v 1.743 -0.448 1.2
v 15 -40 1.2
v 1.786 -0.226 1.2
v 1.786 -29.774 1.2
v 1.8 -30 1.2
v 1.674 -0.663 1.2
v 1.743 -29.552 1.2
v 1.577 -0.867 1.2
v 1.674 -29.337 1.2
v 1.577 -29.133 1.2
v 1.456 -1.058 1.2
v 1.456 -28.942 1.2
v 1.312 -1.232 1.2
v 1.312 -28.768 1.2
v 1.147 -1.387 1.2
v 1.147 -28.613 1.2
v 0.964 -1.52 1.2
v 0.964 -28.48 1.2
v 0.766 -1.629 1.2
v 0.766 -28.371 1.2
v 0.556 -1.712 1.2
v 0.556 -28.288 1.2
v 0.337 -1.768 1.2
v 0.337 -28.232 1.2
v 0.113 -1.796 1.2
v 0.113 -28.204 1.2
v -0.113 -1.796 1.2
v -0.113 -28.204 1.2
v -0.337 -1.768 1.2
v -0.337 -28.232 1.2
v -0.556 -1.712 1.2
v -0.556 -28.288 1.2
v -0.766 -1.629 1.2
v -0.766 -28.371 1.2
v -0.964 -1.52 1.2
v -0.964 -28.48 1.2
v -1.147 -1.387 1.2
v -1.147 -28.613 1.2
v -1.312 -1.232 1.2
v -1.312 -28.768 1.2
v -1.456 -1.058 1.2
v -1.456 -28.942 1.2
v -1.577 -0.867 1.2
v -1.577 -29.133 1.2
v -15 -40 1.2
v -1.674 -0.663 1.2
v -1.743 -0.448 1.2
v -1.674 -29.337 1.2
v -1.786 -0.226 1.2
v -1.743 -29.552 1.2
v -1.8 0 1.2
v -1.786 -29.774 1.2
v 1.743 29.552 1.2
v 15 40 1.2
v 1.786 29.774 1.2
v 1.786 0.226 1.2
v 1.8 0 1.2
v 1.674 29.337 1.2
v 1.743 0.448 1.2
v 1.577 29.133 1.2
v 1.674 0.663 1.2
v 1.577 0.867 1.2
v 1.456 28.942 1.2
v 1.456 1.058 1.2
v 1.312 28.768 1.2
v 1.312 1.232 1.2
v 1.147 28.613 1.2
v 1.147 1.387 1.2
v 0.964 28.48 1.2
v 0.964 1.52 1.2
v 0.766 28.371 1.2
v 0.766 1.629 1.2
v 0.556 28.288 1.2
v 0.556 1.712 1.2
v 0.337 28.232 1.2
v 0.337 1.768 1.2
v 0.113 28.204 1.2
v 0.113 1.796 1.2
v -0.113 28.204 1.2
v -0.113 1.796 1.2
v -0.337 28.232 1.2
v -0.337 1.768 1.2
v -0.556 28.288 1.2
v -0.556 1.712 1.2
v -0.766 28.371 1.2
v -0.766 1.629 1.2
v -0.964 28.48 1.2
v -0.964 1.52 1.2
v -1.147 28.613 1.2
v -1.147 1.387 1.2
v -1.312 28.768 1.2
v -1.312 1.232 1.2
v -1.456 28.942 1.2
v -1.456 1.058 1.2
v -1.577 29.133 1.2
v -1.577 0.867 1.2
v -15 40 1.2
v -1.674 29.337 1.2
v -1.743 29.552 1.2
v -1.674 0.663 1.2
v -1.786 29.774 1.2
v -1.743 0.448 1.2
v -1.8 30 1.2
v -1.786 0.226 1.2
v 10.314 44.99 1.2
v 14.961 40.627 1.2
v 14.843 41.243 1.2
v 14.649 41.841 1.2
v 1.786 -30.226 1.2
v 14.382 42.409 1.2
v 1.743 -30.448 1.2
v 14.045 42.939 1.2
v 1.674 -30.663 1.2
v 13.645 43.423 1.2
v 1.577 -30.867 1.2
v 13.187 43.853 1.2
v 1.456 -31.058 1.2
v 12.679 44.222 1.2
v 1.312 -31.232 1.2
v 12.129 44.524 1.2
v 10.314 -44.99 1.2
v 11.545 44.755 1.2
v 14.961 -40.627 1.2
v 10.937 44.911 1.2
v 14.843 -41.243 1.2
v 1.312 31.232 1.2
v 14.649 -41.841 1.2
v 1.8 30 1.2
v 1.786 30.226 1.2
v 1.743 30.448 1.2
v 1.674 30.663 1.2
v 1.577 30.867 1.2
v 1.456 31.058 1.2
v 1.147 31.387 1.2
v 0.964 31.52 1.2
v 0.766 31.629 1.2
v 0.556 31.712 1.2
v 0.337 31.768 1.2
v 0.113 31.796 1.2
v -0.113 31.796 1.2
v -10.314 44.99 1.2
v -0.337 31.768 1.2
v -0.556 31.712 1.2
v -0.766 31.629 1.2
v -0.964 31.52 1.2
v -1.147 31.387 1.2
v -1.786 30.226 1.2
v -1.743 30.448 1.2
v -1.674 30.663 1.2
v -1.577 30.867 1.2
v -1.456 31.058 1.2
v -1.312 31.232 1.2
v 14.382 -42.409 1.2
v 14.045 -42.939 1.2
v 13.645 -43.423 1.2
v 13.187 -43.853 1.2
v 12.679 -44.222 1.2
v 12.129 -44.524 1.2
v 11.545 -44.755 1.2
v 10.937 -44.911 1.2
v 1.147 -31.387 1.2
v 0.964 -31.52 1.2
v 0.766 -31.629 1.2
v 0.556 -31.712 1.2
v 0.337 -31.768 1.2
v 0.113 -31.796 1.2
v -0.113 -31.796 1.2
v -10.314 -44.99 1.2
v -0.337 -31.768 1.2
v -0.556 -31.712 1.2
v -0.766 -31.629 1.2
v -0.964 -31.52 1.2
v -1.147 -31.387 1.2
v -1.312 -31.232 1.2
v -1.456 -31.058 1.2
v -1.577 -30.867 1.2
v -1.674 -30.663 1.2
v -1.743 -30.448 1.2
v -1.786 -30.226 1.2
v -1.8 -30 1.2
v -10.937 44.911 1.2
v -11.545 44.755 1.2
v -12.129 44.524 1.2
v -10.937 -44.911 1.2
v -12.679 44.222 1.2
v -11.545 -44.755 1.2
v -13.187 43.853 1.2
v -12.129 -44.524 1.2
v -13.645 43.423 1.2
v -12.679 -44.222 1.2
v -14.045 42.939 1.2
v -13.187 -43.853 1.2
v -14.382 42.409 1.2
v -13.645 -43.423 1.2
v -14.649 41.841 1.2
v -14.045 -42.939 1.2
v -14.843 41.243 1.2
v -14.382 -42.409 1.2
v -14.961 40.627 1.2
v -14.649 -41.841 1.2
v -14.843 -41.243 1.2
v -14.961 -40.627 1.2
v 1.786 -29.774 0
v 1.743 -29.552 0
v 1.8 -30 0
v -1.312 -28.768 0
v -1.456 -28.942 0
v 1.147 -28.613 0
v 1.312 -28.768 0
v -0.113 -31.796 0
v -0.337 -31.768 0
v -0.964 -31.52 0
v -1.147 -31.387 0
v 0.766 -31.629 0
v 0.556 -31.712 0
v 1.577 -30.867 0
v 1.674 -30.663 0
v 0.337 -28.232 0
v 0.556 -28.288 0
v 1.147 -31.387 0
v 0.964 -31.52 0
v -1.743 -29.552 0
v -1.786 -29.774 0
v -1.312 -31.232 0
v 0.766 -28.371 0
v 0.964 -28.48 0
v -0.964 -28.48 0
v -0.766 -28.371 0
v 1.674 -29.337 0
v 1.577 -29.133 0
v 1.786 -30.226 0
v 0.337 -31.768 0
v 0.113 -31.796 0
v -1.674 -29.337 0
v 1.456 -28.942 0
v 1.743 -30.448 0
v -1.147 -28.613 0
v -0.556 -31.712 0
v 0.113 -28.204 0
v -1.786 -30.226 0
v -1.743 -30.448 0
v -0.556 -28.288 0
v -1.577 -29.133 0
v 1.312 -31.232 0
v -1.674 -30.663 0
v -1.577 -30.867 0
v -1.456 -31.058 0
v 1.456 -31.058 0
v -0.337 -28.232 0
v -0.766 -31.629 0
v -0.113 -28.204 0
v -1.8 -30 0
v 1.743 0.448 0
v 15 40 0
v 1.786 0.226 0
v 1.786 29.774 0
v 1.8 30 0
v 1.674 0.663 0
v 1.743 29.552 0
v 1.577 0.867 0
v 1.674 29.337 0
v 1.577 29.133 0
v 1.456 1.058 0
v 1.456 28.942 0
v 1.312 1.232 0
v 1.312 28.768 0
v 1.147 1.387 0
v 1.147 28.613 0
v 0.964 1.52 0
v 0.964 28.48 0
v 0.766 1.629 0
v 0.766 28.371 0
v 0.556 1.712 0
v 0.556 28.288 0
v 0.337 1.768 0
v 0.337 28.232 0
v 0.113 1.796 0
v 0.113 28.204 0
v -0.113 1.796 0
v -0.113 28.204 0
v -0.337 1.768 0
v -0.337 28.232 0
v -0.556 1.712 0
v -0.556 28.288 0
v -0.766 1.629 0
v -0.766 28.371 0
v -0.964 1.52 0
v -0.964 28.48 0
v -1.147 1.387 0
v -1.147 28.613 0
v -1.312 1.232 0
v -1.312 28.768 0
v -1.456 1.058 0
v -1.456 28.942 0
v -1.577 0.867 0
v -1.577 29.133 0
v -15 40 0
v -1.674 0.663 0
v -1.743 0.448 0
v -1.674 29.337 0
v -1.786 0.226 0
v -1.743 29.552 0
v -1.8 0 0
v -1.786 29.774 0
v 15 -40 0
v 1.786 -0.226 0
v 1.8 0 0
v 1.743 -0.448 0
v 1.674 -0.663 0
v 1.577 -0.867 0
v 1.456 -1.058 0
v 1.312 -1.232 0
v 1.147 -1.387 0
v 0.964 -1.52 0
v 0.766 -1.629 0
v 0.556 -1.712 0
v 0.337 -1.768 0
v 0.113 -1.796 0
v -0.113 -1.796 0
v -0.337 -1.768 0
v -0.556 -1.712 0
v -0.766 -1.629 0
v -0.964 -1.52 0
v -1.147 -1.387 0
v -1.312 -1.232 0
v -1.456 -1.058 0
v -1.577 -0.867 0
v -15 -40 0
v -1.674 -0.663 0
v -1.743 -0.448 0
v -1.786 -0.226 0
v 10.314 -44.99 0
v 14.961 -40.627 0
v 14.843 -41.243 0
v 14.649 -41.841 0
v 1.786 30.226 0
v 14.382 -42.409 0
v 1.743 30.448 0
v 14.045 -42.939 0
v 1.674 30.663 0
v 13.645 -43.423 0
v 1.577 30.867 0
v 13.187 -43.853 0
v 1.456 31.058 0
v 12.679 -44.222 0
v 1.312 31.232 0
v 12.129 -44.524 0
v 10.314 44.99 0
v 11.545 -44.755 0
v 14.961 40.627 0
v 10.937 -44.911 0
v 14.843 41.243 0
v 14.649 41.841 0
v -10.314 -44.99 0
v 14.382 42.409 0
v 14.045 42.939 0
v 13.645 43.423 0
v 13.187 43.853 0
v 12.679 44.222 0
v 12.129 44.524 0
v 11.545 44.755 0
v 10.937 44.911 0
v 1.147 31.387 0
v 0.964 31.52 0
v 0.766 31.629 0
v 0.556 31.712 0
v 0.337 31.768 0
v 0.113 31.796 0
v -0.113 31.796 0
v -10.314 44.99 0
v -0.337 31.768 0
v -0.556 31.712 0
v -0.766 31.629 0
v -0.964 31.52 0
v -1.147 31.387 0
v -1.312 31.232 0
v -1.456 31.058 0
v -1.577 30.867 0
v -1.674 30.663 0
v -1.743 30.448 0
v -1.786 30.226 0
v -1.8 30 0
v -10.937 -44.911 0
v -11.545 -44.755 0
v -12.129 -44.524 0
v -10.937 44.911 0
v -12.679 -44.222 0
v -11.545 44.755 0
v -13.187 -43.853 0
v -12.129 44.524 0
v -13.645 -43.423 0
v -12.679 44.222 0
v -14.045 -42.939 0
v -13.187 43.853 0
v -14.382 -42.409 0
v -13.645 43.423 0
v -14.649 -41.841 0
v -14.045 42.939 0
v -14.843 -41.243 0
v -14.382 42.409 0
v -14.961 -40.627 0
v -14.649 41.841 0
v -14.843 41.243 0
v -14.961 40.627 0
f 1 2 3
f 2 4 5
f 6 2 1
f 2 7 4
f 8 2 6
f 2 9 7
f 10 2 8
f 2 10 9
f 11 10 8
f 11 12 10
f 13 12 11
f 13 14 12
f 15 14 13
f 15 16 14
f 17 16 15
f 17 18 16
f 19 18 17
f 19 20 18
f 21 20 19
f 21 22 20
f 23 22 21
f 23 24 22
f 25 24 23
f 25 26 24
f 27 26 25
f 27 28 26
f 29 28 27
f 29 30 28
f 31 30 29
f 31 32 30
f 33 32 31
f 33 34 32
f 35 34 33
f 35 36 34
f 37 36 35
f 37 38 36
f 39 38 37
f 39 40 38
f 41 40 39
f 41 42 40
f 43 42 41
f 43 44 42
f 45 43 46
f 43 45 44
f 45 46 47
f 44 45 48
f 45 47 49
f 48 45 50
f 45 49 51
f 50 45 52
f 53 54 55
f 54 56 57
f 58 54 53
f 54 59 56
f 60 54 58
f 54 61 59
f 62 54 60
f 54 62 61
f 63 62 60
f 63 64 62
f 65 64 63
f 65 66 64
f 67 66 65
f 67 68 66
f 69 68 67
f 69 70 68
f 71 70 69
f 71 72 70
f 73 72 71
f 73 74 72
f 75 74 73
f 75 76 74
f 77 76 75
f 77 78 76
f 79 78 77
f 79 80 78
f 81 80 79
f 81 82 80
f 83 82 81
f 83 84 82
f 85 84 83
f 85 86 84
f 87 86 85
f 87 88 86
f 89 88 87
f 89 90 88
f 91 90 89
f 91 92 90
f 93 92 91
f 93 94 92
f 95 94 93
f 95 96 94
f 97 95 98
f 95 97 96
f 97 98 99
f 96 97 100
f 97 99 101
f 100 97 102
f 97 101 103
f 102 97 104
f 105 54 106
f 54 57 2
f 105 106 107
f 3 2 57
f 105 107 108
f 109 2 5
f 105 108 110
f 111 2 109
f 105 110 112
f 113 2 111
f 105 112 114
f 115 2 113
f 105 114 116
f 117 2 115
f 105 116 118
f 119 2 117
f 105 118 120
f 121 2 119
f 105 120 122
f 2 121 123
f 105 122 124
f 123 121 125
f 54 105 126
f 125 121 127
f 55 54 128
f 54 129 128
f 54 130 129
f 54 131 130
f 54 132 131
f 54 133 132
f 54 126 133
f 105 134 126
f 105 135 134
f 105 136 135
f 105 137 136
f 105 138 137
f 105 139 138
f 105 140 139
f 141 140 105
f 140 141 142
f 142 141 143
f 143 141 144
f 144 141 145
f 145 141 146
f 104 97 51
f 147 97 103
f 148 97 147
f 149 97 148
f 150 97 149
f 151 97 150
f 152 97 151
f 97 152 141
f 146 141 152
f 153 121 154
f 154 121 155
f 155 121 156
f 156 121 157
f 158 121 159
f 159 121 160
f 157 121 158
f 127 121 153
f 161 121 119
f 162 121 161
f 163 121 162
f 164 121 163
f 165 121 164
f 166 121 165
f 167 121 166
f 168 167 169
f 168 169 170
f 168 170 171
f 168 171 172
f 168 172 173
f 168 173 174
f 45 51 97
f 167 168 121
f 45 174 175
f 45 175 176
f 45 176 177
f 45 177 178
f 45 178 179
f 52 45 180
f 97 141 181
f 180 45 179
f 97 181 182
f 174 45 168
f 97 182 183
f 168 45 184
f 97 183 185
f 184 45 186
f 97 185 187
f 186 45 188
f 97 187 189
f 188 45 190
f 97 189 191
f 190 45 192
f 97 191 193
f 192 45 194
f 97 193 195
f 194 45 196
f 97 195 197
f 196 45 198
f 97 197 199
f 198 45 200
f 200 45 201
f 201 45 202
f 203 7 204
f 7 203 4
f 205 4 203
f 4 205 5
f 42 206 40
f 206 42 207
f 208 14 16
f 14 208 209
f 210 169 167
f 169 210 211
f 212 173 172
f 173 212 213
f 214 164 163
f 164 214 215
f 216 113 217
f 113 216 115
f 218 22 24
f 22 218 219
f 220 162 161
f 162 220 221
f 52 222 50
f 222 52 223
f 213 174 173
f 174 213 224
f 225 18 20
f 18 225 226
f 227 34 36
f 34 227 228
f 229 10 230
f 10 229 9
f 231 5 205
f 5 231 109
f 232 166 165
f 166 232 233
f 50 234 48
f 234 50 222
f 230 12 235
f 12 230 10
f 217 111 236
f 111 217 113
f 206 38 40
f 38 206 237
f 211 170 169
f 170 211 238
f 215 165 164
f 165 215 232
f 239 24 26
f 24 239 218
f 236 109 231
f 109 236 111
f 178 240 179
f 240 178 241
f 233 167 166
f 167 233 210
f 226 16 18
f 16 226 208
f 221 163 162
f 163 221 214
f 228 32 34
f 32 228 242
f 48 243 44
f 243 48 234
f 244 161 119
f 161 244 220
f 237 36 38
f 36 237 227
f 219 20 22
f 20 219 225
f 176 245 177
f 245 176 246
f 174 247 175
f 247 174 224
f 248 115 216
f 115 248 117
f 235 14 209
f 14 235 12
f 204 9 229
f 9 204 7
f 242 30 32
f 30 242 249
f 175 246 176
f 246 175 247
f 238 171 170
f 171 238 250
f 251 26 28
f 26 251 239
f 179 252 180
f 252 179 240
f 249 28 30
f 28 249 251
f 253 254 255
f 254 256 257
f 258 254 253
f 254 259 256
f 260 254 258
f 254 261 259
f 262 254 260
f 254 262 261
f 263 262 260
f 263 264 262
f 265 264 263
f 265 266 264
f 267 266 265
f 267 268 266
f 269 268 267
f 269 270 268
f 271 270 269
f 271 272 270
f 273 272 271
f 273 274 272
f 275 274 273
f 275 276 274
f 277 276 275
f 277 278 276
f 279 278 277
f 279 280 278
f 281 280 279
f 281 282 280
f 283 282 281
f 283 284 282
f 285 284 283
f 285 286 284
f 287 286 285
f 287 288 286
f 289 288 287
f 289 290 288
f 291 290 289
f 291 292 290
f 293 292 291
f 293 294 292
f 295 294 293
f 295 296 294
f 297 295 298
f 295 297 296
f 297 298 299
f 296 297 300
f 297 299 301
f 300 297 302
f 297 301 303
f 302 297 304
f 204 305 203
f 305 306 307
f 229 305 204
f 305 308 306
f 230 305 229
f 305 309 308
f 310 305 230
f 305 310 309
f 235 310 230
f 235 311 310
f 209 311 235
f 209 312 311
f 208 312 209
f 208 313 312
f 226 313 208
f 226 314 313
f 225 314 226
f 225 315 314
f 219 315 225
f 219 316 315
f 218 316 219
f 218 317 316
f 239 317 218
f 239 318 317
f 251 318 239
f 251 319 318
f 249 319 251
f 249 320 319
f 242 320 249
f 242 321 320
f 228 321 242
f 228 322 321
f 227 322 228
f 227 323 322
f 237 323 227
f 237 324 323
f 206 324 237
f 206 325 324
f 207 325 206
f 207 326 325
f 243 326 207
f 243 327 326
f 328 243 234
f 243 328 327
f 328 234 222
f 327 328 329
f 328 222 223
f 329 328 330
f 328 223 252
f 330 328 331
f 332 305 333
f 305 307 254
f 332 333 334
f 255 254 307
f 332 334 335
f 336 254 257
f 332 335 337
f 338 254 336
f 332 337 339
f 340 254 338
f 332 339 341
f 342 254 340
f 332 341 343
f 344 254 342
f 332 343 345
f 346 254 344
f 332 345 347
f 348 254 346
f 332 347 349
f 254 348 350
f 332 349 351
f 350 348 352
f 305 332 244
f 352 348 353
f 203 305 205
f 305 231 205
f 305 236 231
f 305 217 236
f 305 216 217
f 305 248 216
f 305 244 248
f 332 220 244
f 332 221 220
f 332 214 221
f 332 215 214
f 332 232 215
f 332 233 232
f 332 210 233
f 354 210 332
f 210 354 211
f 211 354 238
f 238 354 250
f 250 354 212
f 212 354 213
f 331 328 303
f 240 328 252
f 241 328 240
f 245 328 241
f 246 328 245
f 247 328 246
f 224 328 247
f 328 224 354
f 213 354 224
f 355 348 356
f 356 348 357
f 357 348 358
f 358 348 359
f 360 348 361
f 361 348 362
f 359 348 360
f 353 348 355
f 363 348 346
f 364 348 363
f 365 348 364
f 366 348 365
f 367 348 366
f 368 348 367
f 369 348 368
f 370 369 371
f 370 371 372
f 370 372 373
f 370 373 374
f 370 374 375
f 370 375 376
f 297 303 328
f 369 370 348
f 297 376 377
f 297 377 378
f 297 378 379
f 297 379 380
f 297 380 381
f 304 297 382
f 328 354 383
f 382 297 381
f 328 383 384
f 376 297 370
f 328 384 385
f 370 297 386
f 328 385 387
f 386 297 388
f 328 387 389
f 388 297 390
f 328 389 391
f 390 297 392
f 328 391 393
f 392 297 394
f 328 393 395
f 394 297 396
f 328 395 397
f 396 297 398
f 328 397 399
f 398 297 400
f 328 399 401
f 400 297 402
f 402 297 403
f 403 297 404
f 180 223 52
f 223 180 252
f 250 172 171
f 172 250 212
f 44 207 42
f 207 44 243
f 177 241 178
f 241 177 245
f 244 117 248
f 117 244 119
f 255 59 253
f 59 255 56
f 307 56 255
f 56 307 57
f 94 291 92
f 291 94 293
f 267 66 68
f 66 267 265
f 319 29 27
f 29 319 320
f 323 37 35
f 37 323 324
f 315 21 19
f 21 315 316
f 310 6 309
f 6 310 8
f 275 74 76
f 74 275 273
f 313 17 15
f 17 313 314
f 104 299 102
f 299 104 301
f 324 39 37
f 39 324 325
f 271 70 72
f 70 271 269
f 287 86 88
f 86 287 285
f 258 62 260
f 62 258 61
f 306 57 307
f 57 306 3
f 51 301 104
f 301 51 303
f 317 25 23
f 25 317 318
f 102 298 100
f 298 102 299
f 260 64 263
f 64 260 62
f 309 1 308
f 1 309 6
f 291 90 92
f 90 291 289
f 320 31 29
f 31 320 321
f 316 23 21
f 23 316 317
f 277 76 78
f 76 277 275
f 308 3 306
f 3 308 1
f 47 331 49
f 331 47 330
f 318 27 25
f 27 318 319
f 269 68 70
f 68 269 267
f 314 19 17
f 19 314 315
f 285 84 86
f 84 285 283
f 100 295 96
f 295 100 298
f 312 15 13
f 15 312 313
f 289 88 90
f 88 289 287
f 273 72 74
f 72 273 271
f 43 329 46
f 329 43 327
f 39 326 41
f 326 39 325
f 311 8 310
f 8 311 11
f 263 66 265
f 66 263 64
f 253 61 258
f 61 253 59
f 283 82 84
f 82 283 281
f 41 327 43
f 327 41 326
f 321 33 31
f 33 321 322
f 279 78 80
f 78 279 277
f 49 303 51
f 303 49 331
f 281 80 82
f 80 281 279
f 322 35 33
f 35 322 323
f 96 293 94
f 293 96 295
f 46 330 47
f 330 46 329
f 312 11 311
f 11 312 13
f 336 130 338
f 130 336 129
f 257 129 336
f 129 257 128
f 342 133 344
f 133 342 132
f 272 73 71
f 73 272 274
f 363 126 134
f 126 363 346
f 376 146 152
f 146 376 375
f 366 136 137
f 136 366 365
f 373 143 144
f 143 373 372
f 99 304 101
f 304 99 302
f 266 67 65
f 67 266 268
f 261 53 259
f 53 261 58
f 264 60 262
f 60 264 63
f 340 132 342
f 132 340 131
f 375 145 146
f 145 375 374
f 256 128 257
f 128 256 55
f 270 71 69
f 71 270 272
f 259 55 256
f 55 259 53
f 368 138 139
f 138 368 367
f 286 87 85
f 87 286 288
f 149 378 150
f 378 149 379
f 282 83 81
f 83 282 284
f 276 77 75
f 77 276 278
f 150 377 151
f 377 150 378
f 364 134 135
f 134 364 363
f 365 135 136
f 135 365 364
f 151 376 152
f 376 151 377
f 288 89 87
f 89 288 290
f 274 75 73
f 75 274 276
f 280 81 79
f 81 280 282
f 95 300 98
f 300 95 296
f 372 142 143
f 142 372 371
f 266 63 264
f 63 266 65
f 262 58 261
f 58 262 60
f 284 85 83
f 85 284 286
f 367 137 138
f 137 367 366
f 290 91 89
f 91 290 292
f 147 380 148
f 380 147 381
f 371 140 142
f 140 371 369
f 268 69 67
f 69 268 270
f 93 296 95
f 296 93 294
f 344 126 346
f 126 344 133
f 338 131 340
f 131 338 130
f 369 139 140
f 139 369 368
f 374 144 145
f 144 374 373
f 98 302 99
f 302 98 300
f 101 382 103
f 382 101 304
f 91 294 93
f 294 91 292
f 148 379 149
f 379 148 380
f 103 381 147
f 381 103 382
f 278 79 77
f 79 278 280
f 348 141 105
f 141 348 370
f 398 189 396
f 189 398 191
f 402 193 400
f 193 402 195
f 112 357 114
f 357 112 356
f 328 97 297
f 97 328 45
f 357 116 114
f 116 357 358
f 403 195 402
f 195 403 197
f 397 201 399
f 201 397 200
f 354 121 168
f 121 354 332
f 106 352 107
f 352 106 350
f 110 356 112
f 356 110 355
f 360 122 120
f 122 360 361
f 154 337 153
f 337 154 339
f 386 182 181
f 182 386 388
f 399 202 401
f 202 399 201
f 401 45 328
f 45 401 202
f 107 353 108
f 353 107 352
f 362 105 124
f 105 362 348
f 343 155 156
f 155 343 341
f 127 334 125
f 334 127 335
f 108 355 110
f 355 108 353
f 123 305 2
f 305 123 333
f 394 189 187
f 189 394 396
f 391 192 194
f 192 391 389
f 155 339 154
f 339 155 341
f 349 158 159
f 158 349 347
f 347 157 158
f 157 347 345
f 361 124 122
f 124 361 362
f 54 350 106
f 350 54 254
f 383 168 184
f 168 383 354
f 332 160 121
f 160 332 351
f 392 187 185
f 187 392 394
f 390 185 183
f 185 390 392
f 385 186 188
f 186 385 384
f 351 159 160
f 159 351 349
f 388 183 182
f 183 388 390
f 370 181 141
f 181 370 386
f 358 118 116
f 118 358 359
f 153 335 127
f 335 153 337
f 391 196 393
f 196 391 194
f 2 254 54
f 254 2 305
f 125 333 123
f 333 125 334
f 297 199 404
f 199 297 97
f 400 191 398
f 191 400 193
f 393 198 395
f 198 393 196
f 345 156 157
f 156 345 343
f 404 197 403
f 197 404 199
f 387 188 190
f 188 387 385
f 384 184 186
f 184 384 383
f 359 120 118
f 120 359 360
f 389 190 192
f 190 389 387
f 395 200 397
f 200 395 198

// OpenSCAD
$fn = 50;


difference() {
	union() {
		hull() {
			translate(v = [-10.0000000000, 40.0000000000, 0]) {
				cylinder(h = 18, r = 5);
			}
			translate(v = [10.0000000000, 40.0000000000, 0]) {
				cylinder(h = 18, r = 5);
			}
			translate(v = [-10.0000000000, -40.0000000000, 0]) {
				cylinder(h = 18, r = 5);
			}
			translate(v = [10.0000000000, -40.0000000000, 0]) {
				cylinder(h = 18, r = 5);
			}
		}
	}
	union() {
		translate(v = [0, 0, 1.2000000000]) {
			hull() {
				translate(v = [-10.0000000000, 40.0000000000, 0]) {
					cylinder(h = 16.8000000000, r = 3.8000000000);
				}
				translate(v = [10.0000000000, 40.0000000000, 0]) {
					cylinder(h = 16.8000000000, r = 3.8000000000);
				}
				translate(v = [-10.0000000000, -40.0000000000, 0]) {
					cylinder(h = 16.8000000000, r = 3.8000000000);
				}
				translate(v = [10.0000000000, -40.0000000000, 0]) {
					cylinder(h = 16.8000000000, r = 3.8000000000);
				}
			}
		}
		#translate(v = [0.0000000000, -30.0000000000, 0]) {
			cylinder(h = 1.2000000000, r = 1.8000000000);
		}
		#cylinder(h = 1.2000000000, r = 1.8000000000);
		#translate(v = [0.0000000000, 30.0000000000, 0]) {
			cylinder(h = 1.2000000000, r = 1.8000000000);
		}
		translate(v = [-250.0000000000, -250.0000000000, 1.2000000000]) {
			cube(size = [500, 500, 500]);
		}
		translate(v = [-250.0000000000, -250.0000000000, 1.2000000000]) {
			cube(size = [500, 500, 500]);
		}
		translate(v = [-250.0000000000, -250.0000000000, 1.2000000000]) {
			cube(size = [500, 500, 500]);
		}
	}
}
